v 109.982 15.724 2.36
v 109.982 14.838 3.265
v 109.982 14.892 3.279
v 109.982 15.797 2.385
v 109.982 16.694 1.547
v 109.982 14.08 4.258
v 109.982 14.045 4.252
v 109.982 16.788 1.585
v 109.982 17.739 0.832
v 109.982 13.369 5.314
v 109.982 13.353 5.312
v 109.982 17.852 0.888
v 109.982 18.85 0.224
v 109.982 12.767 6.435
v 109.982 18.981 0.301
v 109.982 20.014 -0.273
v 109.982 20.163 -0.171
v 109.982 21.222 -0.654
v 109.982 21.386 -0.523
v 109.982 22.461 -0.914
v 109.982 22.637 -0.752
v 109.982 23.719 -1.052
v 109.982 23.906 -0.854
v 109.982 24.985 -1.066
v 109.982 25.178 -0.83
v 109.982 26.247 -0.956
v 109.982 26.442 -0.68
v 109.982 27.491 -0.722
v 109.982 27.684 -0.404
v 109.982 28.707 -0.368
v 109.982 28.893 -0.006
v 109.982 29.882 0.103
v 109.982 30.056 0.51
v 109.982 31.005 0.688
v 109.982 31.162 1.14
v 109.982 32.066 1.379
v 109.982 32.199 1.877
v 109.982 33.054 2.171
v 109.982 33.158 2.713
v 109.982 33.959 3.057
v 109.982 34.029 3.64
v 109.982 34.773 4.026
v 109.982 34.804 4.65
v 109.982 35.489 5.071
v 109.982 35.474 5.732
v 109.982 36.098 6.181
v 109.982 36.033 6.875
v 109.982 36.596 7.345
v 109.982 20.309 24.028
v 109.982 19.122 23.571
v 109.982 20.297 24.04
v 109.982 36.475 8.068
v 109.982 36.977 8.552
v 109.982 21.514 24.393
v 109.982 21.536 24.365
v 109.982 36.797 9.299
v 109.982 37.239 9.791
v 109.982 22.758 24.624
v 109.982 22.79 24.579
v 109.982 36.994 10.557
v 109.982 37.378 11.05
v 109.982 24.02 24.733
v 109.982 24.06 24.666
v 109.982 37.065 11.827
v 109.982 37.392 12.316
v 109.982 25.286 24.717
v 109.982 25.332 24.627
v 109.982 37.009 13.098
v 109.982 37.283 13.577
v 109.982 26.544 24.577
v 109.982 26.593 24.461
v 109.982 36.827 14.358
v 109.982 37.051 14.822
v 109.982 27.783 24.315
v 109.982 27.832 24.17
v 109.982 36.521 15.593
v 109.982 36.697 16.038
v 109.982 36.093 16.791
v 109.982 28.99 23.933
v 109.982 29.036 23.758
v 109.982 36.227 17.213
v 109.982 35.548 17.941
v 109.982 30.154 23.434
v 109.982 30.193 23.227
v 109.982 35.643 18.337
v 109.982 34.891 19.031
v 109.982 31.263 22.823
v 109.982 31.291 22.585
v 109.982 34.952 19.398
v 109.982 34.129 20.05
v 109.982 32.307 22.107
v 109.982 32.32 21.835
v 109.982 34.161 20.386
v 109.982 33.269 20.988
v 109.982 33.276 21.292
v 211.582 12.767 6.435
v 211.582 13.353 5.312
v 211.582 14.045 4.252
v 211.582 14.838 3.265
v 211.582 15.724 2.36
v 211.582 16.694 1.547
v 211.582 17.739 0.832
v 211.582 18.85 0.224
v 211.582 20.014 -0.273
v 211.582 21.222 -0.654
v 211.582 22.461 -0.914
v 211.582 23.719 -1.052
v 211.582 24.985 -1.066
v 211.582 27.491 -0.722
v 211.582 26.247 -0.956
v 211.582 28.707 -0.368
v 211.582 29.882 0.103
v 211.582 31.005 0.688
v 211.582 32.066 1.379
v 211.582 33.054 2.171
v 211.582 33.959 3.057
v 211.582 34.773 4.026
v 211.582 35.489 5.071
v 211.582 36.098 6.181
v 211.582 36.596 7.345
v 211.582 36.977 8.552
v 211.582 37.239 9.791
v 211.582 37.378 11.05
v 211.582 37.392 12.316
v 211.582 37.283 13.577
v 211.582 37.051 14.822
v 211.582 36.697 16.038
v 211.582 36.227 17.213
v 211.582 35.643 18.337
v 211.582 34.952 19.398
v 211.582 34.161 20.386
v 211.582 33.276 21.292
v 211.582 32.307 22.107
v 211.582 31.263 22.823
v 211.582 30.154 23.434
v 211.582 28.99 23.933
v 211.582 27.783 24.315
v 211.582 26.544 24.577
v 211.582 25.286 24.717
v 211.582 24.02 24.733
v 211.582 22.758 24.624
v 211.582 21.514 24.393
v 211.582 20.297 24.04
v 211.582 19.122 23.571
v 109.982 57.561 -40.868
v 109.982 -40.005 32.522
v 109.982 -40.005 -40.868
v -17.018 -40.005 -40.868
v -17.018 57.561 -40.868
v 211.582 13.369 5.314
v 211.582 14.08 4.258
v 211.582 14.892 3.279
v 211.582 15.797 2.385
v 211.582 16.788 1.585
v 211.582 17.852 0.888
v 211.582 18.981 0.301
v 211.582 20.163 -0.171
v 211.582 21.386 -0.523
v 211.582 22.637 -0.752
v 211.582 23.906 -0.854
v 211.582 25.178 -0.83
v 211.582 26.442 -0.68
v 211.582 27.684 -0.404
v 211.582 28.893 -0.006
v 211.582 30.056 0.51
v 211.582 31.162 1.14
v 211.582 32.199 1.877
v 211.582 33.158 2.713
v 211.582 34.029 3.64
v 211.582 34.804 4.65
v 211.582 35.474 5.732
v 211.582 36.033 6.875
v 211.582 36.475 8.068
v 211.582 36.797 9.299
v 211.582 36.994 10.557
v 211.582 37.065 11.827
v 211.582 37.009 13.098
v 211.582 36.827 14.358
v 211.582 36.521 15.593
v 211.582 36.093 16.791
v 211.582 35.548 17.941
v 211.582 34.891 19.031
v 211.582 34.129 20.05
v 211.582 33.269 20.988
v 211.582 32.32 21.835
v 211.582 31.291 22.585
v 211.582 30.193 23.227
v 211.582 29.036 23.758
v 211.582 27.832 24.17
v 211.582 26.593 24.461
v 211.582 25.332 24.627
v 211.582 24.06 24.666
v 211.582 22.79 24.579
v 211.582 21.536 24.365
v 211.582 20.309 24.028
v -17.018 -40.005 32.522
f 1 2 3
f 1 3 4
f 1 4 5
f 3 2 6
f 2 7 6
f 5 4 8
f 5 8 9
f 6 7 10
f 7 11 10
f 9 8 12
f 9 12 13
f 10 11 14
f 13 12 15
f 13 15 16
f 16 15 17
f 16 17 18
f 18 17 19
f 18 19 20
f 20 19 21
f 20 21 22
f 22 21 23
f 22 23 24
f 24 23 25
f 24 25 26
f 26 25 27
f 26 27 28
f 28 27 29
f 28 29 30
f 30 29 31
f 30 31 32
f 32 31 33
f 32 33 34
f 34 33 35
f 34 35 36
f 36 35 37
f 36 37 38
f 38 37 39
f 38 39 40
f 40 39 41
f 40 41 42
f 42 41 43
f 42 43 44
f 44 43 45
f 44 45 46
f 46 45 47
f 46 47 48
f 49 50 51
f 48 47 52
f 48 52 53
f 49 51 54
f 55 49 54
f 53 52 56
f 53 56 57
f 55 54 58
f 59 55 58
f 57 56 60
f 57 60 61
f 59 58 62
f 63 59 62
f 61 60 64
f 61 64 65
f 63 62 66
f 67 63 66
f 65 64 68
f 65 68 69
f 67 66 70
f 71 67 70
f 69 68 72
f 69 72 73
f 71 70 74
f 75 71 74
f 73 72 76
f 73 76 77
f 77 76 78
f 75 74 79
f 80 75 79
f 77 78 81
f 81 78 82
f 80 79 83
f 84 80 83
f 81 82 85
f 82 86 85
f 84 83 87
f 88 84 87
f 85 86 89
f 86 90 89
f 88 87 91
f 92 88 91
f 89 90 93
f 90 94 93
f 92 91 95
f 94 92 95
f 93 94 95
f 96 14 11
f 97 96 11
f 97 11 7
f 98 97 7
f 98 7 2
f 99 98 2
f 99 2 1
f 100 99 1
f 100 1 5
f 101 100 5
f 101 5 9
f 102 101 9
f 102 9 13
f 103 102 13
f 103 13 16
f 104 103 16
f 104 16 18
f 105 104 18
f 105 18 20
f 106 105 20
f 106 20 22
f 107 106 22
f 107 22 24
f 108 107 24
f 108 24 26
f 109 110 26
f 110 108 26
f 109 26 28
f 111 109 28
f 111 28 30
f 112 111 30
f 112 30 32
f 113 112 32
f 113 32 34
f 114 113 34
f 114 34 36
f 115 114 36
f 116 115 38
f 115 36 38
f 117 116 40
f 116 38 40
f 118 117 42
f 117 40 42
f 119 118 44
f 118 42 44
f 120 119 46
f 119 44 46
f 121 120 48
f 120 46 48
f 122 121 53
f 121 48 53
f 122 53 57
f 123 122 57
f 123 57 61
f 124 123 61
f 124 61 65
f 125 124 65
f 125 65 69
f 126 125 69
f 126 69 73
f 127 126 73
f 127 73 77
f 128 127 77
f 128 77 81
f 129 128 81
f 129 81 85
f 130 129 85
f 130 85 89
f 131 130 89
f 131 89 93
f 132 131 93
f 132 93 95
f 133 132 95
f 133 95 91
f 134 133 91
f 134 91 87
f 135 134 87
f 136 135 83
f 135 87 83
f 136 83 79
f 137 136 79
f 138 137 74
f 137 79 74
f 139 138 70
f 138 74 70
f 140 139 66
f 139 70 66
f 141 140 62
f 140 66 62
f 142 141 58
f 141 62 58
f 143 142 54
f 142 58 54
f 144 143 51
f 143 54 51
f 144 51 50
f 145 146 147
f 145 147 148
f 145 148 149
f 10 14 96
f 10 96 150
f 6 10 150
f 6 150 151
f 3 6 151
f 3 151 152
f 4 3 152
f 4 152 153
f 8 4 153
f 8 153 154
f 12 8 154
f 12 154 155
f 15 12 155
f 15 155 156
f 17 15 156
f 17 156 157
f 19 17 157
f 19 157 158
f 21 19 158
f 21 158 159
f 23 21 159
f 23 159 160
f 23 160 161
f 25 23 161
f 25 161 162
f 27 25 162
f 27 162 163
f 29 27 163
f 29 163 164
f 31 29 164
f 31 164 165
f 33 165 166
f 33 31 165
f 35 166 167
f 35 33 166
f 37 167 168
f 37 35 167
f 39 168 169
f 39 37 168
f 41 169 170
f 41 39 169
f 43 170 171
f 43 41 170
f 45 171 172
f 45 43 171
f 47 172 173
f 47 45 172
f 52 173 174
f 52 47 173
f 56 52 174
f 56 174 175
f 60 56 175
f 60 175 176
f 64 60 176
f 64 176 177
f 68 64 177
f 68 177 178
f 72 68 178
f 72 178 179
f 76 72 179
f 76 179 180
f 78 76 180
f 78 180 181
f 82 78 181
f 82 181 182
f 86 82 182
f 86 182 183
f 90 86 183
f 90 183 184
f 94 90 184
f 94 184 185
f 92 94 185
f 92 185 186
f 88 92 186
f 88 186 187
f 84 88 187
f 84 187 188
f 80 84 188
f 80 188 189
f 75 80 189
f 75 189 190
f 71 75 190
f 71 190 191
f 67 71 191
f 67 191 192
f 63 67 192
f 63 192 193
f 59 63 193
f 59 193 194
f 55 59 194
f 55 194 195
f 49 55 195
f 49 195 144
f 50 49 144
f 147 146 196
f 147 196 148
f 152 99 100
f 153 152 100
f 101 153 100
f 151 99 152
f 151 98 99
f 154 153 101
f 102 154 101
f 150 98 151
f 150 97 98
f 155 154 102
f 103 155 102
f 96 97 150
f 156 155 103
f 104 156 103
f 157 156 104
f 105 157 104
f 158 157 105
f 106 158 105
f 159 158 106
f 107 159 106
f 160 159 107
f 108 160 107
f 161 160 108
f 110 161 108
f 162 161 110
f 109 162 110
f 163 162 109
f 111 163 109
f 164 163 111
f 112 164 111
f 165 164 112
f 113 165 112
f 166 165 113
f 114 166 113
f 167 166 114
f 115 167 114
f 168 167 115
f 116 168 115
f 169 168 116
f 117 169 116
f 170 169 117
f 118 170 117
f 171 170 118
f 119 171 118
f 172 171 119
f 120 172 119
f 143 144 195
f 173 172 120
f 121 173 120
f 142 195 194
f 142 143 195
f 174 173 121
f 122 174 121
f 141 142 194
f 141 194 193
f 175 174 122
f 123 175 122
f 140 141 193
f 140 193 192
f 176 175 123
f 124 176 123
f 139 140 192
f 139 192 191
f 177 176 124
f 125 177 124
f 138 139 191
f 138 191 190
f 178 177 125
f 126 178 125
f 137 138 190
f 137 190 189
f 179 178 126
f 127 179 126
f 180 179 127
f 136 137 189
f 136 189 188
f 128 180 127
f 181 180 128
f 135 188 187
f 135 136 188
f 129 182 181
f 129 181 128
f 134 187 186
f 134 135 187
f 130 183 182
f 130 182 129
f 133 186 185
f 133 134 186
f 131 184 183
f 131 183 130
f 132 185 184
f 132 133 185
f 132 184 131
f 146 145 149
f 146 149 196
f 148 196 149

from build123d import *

# Parameters (mm, degrees)
F2_DEPTH = 127
F3_DEPTH = 127
F4_R     = 12.764484
F5_DEPTH = 127
F6_R     = 12.908332
F7_DEPTH = 101.6


with BuildPart() as f2:
    # F1 (on offset) → F2 (new body)
    with BuildSketch(Plane.YZ.offset(109.982)):
        Polygon((57.561152, -40.868416), (-40.004998, 32.522053), (-40.004998, -40.868416), align=None)
    extrude(amount=-F2_DEPTH)


with BuildPart() as f3:
    # F1 (on offset) → F3 (new body)
    with BuildSketch(Plane.YZ.offset(109.982)):
        Polygon((57.561152, 32.522053), (-40.004998, 32.522053), (57.561152, -40.868416), align=None)
    extrude(amount=F3_DEPTH)

    # F4 (on offset) → F5 (cut)
    with BuildSketch(Plane.YZ.offset(109.982)):
        with Locations((24.300953, 11.904083)):
            Circle(F4_R)
    extrude(amount=F5_DEPTH, mode=Mode.SUBTRACT)

    # F6 (on offset) → F7 (intersect)
    with BuildSketch(Plane.YZ.offset(109.982)):
        with Locations((24.493001, 11.832868)):
            Circle(F6_R)
    extrude(amount=F7_DEPTH, mode=Mode.INTERSECT)


solid = Compound([f2.part, f3.part])
